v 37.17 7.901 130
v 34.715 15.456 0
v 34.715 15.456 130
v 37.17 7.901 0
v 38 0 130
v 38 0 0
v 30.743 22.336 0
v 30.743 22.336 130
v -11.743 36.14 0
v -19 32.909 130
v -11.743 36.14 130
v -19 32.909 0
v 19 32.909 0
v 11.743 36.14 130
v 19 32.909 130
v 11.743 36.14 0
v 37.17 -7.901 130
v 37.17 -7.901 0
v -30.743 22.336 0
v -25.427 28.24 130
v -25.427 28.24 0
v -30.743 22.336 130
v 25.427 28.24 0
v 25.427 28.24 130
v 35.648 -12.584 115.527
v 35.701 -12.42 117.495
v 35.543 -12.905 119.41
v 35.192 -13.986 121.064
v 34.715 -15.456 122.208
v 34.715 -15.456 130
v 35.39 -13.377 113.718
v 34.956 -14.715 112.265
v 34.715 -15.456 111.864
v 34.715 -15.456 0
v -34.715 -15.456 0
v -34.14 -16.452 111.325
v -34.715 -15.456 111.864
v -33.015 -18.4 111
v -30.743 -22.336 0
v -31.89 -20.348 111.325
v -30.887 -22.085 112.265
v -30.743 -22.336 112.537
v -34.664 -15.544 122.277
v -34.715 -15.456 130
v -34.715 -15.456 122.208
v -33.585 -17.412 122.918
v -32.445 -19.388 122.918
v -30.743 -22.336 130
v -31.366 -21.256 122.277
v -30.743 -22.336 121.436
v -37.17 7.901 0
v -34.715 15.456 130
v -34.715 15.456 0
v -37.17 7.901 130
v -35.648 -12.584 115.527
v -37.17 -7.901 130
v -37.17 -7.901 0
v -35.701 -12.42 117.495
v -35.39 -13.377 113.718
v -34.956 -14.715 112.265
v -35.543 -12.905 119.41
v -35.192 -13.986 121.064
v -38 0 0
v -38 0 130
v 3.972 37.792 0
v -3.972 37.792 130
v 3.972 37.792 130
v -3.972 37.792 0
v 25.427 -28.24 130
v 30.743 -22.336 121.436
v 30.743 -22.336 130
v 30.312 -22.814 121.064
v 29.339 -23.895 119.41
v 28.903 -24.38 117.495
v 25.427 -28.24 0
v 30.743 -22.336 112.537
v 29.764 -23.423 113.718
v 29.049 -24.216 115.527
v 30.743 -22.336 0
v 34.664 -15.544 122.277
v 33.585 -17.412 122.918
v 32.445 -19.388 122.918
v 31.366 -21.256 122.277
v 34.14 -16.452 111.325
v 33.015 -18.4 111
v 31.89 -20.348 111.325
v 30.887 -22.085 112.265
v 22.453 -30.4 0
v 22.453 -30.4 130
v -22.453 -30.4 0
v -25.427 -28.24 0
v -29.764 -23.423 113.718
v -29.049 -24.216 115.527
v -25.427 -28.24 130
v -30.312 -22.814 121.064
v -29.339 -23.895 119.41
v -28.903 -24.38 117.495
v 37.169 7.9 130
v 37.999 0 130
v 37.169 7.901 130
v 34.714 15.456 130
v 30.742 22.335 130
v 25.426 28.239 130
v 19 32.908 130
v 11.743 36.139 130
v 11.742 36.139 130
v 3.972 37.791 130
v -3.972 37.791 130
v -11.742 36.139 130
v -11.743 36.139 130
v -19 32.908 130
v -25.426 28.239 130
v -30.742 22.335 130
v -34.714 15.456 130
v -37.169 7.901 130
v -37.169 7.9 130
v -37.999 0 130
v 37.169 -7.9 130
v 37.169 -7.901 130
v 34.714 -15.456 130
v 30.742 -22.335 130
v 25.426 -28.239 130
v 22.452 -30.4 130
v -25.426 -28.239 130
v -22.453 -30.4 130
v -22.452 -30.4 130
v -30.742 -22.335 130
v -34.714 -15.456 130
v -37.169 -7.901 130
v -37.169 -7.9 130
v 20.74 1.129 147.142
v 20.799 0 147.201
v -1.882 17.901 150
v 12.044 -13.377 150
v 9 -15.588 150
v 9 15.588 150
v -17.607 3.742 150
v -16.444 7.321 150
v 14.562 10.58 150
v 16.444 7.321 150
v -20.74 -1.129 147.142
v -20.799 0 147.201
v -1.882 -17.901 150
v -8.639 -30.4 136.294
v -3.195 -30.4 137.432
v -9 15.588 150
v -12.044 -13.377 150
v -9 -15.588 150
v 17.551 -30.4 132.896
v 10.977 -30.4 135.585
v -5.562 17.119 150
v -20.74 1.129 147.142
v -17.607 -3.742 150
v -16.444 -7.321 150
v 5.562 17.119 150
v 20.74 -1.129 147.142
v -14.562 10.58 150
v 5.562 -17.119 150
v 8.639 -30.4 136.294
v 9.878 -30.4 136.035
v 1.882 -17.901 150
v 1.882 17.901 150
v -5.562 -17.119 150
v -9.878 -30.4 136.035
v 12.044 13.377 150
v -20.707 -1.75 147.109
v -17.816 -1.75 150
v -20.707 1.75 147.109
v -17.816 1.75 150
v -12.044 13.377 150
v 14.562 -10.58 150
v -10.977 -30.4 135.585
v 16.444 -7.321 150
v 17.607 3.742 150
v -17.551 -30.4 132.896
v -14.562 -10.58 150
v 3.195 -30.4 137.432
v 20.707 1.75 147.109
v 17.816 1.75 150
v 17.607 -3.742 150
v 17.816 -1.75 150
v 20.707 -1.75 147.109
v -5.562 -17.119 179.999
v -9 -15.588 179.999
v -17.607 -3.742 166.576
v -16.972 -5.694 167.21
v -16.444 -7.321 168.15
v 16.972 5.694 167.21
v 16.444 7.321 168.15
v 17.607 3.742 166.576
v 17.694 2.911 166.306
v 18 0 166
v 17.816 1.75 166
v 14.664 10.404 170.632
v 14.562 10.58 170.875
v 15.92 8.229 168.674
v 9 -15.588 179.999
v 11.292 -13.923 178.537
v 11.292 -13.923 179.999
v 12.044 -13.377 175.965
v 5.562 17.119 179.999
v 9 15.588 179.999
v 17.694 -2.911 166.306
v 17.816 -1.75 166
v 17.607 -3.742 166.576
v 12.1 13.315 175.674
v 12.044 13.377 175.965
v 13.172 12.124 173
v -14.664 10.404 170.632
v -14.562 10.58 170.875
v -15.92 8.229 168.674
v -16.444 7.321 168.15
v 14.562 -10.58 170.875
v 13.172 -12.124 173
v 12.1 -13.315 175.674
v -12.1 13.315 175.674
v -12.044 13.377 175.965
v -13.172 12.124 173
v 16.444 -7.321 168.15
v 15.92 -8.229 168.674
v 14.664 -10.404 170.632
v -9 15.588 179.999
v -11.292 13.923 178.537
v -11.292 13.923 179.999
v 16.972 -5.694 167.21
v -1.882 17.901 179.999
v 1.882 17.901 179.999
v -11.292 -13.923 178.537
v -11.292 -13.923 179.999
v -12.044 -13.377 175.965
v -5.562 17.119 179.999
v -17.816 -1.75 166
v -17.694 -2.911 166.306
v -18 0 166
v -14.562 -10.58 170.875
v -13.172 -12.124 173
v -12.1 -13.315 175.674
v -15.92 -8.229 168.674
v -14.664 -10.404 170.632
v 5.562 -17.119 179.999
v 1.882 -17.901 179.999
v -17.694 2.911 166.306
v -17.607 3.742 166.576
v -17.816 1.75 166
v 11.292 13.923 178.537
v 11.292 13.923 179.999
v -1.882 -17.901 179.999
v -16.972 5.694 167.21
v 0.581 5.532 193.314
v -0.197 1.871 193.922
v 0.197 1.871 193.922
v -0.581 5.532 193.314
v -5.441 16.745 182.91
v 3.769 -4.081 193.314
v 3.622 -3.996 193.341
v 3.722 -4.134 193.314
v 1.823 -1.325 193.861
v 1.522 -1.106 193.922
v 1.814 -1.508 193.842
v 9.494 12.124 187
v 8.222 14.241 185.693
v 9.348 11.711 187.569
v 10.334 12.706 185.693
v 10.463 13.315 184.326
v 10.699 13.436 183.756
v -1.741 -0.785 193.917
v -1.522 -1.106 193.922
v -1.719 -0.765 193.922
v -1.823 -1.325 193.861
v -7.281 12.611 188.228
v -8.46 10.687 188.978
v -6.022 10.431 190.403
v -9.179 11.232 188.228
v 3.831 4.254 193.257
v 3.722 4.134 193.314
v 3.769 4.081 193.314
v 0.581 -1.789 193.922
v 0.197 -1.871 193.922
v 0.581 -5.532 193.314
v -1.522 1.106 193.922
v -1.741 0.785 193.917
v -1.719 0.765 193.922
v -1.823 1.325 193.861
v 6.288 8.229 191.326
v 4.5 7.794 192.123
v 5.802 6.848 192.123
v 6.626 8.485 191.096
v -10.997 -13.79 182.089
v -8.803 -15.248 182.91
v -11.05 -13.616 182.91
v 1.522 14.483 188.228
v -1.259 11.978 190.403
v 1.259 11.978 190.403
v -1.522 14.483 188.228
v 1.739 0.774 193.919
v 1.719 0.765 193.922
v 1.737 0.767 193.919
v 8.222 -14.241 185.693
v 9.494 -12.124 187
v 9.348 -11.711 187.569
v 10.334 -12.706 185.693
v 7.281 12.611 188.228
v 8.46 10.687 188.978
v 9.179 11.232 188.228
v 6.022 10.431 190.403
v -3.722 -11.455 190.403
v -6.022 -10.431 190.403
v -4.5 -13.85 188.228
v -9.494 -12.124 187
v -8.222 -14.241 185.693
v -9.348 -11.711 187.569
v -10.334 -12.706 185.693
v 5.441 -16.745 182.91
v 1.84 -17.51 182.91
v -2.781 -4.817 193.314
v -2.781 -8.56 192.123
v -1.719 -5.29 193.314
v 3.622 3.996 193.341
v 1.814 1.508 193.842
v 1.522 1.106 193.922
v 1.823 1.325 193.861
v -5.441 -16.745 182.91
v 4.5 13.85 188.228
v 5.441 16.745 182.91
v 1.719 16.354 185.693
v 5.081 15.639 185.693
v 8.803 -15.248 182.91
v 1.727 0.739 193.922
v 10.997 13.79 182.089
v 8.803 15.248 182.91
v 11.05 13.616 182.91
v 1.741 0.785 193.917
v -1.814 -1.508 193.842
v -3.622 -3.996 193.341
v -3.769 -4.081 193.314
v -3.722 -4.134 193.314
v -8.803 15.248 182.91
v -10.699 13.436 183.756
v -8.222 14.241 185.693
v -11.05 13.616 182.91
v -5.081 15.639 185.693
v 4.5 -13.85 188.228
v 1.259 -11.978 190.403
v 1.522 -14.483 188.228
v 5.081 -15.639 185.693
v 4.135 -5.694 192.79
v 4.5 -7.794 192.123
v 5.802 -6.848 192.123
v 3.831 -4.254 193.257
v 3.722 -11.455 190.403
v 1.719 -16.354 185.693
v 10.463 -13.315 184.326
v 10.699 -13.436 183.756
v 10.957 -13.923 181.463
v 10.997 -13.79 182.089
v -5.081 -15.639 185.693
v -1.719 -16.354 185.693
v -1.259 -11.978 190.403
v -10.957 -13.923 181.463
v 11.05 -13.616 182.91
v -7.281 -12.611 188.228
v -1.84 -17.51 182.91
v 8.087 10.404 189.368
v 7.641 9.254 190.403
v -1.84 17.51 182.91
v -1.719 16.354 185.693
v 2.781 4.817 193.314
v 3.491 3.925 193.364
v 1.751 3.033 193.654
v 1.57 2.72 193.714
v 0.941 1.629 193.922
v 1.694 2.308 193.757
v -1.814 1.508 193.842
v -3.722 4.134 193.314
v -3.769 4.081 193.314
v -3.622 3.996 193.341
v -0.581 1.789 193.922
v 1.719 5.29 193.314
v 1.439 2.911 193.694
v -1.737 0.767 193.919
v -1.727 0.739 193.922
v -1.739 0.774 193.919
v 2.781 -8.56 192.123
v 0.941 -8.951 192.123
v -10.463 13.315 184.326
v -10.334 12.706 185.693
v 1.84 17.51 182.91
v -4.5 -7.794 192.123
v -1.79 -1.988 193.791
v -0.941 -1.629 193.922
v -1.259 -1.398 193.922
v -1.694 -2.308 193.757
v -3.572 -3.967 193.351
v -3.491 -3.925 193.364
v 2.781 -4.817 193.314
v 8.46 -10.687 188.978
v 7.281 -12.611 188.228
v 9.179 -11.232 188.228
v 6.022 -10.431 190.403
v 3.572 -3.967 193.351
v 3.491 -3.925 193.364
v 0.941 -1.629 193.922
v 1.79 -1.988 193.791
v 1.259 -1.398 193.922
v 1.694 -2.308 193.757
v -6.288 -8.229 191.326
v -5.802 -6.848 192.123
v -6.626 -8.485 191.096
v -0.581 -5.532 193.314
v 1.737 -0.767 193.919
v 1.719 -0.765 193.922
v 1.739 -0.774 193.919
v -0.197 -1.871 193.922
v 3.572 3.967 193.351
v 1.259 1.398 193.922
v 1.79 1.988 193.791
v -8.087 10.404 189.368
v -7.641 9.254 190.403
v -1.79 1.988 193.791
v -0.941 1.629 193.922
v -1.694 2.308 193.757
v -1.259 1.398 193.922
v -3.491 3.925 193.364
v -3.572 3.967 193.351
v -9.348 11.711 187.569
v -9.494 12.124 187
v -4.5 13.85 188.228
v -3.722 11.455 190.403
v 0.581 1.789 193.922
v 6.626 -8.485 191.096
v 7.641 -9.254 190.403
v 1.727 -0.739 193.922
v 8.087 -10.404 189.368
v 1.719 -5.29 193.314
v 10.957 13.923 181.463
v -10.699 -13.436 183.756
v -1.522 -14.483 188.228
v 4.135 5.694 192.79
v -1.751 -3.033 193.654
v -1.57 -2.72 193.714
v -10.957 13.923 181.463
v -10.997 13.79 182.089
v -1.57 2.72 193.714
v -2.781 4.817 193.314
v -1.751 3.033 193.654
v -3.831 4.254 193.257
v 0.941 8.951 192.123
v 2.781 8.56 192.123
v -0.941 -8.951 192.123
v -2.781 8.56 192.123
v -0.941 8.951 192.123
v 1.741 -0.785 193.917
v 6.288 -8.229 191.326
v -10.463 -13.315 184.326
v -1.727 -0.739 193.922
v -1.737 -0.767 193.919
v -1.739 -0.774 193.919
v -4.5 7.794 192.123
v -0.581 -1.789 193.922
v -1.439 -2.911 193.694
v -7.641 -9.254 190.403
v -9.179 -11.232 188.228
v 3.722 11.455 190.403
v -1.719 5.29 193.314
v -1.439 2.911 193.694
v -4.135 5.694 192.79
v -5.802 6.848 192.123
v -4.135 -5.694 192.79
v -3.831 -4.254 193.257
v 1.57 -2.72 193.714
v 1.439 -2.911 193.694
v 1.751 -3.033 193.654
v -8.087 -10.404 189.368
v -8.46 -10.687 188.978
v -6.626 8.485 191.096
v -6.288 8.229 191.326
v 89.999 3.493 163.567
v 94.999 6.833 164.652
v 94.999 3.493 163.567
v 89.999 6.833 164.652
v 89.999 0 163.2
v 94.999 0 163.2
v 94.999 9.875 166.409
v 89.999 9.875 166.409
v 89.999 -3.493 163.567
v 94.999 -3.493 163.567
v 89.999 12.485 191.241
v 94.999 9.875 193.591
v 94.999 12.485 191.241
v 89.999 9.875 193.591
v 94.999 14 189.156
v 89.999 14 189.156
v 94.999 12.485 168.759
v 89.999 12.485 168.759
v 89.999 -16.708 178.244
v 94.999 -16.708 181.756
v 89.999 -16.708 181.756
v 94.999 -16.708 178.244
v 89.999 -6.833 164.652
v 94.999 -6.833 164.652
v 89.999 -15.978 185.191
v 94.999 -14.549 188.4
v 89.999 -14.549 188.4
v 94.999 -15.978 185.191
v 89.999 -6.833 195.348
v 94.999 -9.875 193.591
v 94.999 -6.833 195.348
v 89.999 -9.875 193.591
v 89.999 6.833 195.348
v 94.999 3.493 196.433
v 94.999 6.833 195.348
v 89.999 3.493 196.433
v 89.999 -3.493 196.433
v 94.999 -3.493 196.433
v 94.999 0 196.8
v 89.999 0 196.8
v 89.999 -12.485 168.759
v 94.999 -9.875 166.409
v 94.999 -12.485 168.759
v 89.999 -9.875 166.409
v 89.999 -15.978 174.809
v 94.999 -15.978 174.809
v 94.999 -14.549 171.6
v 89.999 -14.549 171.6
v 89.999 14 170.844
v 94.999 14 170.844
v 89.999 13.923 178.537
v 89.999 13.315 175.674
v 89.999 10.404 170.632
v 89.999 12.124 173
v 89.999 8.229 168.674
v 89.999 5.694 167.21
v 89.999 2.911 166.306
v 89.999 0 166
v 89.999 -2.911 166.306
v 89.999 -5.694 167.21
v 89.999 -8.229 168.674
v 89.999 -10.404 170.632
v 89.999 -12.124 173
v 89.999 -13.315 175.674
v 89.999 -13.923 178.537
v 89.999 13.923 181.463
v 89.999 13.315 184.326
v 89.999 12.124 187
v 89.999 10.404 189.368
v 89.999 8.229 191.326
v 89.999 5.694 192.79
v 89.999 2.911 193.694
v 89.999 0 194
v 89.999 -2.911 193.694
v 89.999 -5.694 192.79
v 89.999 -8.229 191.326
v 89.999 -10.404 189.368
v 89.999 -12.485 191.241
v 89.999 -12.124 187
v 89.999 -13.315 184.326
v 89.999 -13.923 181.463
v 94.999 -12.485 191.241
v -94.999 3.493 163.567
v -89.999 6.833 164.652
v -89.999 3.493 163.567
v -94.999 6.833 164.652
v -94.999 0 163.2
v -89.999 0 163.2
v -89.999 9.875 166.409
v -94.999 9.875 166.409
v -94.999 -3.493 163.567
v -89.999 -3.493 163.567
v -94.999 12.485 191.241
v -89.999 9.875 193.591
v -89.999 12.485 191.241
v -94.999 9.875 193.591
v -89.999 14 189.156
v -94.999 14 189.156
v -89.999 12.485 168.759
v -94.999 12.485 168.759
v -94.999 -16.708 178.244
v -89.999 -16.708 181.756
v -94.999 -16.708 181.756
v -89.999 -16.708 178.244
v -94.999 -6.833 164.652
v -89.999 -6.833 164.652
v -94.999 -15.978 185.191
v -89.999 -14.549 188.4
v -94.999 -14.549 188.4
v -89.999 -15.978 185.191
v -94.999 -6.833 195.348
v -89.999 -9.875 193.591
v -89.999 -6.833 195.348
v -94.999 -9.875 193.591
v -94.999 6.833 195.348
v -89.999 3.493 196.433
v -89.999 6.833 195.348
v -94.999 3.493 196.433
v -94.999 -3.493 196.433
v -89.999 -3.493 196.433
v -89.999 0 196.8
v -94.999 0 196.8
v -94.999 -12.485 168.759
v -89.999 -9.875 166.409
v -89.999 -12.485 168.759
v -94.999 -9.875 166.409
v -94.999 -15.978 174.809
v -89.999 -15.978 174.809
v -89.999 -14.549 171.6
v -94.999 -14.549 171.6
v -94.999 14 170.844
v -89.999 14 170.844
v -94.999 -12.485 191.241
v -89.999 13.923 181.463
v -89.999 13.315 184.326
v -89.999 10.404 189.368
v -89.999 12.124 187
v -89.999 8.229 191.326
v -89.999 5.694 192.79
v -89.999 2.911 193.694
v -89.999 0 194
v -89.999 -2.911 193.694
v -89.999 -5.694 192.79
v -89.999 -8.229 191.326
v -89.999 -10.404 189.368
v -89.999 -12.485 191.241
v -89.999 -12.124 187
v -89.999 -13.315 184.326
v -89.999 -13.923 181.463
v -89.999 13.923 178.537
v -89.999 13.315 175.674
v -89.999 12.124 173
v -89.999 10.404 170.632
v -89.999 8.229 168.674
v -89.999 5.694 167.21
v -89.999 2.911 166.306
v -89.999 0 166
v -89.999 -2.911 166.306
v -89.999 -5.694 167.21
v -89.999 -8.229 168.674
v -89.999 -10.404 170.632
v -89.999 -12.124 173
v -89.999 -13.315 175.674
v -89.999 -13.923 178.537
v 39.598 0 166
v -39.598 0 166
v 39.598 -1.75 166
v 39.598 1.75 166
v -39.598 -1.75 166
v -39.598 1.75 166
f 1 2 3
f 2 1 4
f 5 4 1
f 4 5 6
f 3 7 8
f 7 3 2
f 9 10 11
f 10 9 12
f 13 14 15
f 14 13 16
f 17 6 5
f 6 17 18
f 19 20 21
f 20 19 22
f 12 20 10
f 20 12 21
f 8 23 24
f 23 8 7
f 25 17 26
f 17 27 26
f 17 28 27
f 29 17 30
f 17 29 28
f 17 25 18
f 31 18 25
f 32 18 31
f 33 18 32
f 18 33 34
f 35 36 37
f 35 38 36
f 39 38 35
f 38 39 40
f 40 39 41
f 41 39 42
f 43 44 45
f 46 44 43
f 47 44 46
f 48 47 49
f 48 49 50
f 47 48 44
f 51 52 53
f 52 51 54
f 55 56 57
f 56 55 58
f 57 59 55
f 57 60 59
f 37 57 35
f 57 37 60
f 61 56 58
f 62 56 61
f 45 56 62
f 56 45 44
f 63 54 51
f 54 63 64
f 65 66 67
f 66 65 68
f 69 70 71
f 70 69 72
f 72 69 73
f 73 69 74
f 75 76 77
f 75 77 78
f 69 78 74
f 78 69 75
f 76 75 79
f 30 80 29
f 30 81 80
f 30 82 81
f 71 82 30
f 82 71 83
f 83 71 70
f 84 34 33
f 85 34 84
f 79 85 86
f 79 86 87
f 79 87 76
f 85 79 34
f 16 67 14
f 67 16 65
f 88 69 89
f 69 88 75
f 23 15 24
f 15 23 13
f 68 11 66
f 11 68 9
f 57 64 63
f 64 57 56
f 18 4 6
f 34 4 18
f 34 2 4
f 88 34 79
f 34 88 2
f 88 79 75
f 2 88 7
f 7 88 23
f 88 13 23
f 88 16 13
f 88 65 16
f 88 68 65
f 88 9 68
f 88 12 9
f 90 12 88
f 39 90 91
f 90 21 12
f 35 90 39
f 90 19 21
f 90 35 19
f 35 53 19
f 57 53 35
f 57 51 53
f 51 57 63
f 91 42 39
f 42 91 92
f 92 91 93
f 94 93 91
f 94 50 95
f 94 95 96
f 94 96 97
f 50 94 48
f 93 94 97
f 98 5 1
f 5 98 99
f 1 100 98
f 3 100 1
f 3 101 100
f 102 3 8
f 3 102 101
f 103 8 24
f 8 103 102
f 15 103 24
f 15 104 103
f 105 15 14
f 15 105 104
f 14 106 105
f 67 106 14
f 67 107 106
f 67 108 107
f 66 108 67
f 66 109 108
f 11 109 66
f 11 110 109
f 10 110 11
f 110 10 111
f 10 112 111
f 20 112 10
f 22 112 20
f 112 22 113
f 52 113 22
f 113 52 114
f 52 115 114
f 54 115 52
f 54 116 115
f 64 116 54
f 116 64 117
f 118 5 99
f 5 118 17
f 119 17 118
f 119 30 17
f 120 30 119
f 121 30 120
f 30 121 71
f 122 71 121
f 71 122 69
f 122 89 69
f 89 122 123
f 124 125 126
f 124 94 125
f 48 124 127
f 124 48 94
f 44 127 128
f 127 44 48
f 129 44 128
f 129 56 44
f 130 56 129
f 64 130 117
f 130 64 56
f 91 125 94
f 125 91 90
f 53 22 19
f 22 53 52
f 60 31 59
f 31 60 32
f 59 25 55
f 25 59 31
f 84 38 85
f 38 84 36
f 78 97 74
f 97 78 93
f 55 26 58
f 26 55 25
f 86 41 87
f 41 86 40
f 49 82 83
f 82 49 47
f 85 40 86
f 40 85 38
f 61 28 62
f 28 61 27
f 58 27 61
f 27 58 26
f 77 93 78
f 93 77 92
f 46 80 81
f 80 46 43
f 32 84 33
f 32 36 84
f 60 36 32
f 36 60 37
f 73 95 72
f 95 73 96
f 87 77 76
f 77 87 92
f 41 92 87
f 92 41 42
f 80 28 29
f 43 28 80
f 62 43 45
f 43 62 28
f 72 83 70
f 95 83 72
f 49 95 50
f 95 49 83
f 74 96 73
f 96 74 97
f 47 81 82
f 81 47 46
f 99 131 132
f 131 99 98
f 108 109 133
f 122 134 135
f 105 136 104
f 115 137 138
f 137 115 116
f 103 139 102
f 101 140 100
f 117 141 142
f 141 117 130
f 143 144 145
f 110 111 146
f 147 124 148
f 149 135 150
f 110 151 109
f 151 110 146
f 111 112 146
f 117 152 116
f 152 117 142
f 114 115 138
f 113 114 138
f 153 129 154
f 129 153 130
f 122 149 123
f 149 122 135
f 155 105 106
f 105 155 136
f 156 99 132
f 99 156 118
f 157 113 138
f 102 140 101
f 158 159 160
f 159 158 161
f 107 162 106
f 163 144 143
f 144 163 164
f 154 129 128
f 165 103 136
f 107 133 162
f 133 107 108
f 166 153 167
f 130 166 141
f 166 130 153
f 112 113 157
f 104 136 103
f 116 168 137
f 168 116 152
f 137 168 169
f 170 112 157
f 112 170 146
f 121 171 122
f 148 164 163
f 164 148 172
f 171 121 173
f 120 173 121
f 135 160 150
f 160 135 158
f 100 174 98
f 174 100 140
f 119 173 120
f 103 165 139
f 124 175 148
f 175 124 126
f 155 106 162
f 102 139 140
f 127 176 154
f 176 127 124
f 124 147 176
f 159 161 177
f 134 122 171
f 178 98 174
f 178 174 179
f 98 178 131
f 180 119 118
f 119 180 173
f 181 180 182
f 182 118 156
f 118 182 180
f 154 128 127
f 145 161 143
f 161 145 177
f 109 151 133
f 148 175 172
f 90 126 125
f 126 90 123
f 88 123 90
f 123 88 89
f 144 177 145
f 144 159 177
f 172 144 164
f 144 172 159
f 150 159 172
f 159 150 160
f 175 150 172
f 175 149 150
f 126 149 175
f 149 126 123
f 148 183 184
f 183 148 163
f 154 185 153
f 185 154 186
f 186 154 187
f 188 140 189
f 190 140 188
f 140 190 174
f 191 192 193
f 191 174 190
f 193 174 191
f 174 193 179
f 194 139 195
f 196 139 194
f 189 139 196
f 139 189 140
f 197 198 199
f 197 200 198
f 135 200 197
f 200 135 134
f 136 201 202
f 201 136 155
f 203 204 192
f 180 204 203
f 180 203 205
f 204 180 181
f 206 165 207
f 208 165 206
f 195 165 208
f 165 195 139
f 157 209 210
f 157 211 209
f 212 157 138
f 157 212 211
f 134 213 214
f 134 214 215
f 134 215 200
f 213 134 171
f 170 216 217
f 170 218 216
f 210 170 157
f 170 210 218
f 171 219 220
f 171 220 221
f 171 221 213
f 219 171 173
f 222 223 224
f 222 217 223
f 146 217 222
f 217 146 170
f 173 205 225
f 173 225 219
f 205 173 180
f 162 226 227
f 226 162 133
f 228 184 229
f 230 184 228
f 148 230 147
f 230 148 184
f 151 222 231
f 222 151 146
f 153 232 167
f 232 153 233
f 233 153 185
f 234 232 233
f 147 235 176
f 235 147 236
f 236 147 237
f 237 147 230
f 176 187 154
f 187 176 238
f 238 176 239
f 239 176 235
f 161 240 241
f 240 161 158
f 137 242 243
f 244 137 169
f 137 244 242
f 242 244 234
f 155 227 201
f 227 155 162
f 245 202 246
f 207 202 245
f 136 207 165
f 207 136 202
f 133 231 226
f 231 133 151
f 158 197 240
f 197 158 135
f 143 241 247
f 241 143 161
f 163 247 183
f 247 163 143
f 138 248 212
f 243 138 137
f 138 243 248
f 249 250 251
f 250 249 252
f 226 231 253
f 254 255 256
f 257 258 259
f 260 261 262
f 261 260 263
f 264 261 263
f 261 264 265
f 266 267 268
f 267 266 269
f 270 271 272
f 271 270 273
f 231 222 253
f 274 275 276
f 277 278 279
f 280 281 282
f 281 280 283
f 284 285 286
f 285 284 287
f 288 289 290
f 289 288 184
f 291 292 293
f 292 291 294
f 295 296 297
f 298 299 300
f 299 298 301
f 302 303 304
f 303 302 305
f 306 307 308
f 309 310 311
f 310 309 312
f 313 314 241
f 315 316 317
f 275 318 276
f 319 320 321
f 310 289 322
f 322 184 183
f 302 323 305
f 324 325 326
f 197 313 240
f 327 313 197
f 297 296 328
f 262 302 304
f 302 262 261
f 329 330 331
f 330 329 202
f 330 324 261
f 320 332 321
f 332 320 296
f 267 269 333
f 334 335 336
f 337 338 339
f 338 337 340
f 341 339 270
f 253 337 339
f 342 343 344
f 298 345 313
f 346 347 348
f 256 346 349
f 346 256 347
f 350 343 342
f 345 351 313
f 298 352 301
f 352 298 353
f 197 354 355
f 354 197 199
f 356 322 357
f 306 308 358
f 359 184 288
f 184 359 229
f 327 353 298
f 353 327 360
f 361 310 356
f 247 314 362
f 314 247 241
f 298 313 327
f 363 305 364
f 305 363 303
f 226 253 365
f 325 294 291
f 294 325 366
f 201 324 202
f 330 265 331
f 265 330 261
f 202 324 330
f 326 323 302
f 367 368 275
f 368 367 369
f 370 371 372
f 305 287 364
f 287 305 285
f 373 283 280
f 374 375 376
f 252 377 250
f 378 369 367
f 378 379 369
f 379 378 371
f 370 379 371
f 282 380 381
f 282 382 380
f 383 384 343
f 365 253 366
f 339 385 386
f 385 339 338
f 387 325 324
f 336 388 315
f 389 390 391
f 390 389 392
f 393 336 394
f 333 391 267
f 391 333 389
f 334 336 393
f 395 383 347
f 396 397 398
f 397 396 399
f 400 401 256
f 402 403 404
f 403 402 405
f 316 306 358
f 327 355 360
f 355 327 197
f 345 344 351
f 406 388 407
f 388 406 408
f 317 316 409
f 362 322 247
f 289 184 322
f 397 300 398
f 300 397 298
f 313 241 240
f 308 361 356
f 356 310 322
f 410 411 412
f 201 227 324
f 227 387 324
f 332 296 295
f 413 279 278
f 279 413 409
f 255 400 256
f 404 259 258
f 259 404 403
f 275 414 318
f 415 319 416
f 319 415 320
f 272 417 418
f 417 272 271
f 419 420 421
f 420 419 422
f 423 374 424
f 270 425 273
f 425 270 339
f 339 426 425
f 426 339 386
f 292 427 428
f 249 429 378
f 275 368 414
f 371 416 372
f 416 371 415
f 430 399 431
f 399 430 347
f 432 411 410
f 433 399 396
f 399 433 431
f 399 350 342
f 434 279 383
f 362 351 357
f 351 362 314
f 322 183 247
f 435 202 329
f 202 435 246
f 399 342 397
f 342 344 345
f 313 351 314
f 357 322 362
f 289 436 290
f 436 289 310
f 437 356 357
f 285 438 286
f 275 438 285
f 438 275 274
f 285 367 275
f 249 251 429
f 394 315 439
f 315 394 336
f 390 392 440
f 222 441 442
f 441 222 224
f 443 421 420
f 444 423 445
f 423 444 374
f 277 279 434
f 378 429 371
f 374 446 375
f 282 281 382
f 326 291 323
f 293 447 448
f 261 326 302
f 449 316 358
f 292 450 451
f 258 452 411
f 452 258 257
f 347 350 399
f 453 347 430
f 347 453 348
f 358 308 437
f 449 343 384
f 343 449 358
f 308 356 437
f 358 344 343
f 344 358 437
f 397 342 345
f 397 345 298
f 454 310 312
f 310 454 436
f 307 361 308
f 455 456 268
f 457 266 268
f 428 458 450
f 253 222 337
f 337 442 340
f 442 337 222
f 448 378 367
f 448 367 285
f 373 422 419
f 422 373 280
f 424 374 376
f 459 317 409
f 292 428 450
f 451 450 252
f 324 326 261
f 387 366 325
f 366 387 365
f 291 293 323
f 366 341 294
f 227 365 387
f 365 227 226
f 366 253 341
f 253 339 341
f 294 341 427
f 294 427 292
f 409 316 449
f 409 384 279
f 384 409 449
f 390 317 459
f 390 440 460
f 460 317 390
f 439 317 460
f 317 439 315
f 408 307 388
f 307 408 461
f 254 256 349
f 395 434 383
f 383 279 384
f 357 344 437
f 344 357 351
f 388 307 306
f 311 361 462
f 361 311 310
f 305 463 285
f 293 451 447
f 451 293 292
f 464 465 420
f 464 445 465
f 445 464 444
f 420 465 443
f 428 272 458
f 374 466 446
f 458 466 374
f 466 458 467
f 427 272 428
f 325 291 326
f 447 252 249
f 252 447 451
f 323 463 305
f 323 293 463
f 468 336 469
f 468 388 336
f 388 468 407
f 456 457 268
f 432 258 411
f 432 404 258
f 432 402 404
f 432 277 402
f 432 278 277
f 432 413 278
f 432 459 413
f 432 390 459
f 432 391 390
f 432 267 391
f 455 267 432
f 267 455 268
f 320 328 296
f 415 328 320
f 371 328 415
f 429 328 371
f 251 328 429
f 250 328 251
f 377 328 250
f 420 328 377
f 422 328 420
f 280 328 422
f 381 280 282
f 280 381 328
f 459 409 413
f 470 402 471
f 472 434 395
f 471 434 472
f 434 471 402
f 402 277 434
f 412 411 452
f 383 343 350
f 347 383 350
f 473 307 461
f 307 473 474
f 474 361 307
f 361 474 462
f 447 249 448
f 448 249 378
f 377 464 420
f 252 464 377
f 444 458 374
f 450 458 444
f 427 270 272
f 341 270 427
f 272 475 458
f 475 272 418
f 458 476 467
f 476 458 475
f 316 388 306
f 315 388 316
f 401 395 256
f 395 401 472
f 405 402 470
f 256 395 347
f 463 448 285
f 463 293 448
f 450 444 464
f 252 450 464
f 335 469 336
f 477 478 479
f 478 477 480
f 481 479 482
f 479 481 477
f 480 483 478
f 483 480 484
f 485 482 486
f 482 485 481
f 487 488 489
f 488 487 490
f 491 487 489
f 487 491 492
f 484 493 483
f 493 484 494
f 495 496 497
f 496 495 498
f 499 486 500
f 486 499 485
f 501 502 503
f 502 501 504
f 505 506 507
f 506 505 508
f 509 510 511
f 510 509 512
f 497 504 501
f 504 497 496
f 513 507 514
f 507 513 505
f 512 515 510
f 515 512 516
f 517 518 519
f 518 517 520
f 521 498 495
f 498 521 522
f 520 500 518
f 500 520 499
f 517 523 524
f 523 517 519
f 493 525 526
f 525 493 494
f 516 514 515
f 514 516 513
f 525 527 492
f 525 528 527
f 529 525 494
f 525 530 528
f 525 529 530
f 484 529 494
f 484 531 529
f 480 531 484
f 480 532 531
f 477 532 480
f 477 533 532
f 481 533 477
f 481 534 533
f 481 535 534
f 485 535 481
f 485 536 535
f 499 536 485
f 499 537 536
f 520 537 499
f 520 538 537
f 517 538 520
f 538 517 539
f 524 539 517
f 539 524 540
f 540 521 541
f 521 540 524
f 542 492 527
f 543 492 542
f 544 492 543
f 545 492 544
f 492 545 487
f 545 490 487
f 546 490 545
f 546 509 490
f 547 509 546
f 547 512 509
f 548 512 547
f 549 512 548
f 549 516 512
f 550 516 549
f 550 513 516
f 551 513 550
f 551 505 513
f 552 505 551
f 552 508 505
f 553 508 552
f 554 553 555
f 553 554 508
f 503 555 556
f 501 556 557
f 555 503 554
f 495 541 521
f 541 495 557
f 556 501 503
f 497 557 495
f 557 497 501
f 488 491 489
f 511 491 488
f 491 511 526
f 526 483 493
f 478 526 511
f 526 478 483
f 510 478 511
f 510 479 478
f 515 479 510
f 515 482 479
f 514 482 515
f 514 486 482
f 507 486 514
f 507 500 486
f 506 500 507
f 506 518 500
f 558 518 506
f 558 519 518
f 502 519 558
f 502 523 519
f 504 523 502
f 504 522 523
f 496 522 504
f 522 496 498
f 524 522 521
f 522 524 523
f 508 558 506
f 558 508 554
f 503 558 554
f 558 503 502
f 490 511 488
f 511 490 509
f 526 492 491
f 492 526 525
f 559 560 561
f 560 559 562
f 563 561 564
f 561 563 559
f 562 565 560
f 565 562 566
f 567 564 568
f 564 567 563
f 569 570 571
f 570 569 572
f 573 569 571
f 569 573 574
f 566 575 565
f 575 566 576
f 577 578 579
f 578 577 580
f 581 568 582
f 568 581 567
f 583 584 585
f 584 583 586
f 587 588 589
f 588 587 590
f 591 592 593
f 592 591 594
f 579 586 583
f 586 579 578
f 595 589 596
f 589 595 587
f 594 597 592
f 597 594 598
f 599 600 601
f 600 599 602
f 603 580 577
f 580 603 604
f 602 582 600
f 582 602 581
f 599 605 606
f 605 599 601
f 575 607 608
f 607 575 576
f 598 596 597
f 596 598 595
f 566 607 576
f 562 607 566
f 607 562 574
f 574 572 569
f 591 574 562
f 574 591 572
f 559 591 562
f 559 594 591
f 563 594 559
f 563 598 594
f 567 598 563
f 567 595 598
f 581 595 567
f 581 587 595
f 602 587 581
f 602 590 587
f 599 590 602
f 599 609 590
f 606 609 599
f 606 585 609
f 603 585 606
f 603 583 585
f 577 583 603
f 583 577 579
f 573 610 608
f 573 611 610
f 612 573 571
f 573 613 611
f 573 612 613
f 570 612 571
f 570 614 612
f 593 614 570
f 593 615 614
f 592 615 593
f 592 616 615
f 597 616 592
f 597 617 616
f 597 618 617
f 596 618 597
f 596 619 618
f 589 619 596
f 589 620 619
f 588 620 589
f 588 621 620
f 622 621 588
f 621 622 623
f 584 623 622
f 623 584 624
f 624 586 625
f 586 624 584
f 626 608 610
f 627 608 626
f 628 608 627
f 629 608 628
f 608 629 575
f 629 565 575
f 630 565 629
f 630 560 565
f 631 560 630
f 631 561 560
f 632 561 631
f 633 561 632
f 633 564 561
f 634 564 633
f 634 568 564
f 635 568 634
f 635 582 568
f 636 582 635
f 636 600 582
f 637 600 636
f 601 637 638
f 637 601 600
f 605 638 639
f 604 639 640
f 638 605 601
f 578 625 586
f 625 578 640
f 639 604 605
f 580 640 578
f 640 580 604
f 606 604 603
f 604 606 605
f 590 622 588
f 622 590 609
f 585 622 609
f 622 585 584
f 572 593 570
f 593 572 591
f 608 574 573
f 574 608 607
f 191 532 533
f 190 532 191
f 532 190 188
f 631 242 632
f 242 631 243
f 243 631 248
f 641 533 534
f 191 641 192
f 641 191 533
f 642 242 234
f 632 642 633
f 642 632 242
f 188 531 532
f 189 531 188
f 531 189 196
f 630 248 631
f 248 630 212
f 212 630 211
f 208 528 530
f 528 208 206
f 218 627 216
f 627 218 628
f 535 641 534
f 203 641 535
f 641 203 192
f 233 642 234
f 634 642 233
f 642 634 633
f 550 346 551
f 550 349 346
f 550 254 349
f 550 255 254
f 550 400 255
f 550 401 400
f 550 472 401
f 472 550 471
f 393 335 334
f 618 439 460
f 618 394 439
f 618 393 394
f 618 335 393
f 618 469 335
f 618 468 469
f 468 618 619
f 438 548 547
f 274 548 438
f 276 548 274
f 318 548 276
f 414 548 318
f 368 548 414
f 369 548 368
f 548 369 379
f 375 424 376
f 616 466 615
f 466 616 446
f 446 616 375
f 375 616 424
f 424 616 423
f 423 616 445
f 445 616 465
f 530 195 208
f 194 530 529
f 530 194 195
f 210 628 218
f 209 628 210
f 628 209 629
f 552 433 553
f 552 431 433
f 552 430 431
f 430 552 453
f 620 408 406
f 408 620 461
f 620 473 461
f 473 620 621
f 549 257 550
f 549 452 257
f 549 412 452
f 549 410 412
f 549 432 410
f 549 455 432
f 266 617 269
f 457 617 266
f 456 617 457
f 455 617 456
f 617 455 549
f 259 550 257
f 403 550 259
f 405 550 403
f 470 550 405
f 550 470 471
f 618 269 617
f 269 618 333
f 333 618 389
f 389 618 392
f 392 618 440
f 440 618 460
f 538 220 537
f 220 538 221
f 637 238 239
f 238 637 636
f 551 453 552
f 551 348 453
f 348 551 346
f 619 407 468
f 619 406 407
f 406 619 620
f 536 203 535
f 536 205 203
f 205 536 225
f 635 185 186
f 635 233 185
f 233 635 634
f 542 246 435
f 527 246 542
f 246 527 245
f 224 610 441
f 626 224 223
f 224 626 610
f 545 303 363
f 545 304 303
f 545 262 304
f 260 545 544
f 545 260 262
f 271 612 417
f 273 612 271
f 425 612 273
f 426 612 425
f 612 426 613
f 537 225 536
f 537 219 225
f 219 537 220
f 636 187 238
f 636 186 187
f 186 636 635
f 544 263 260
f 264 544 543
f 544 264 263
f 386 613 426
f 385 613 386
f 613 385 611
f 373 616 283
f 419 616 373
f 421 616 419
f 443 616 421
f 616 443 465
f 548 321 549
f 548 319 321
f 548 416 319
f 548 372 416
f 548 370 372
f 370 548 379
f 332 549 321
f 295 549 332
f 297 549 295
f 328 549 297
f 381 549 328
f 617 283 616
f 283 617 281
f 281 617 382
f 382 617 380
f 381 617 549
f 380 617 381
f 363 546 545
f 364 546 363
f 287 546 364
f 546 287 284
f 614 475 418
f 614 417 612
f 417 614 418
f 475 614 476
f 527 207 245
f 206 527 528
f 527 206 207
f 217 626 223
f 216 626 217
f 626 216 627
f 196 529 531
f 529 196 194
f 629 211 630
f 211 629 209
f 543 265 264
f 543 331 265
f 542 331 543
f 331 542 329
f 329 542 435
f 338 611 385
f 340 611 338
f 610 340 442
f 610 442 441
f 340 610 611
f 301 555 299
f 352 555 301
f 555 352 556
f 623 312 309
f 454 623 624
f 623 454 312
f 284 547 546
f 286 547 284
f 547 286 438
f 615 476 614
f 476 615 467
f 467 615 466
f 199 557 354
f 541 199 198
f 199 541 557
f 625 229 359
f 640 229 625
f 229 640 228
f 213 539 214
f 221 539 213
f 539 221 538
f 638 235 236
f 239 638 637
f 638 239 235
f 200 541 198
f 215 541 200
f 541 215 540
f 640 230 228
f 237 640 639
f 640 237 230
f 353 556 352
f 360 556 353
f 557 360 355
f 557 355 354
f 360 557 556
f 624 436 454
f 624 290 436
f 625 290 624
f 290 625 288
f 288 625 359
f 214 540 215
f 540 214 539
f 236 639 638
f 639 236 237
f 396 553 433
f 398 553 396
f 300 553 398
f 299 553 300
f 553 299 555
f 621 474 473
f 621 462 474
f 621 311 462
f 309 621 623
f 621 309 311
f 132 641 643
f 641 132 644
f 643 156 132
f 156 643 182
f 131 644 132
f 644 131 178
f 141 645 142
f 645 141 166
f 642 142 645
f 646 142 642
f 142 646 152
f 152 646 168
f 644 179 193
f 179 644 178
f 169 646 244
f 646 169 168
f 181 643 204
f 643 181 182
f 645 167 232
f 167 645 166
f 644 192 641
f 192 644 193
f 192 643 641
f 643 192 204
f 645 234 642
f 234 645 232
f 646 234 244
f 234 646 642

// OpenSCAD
delta=.001;
cup_height=130;
cup_r=38;
cup_trans_h=20;
cup_trans_r=18;
beam_r=14;
beam_len=90*2;
post_height=30;
post_r=cup_trans_r;
end_cap_r=beam_r*1.2;
end_cap_len=5;
through_hole_r=6;
percent_off_back=.2;


difference() {
    union() {
        color("green") {
            difference() {
                cylinder(h=cup_height, r=cup_r, center=false);
                translate([0, (cup_r*-(1-percent_off_back))+(2*through_hole_r), cup_height*.9]) {
                    rotate([0, 90, 0]){
                        cylinder(h=3*cup_r, r=through_hole_r, center=true);
                    }
                }
            }
        }

        translate([0, 0, cup_height-delta]) {
            cylinder(h=cup_trans_h+delta, r1=cup_r, r2=cup_trans_r, center=false);
        }
    }
    translate([0, -cup_r, (cup_height)-delta]) {
        cube([3*cup_r, percent_off_back*2*cup_r, 2*cup_height], center=true);
    }
}

translate([0, 0, cup_height+cup_trans_h-delta]) {
    cylinder(h=post_height, r=post_r, center=false);
    translate([0, 0, post_height]) {
        scale([1, 1, (beam_r/post_r)]) {
            sphere(post_r);
        }
    }
}

translate([0, 0, cup_height+cup_trans_h+post_height]) {
    rotate([0, 90, 0]){
        color("blue") {
            translate([0,0,(beam_len/2)-delta]){
                difference() {
                    cylinder(h=end_cap_len, r=end_cap_r);
                    translate([-delta, 2*beam_r, 0]) {
                        cube(beam_r*2, center=true);
                    }
                }
            }
        }
        color("black") {
            translate([0,0,(beam_len/-2)-end_cap_len+delta]){
                difference() {
                    cylinder(h=end_cap_len, r=end_cap_r);
                    translate([-delta, 2*beam_r, 0]) {
                        cube(beam_r*2, center=true);
                    }
                }
            }
        }
        
        color("red")
        cylinder(h=beam_len, r=beam_r, center=true);
    }
}

translate([0, 0, cup_height+cup_trans_h+post_height-beam_r]) {
    difference() {
        rotate([0, 45, 0]) {
            color("pink") cube([4*beam_r, beam_r/4, 4*beam_r], center=true);
        }
        translate([0, -delta, 4*beam_r]) {
            cube([8*beam_r, (beam_r) + 2*delta, 8*beam_r], center=true);
        }
   }
}
